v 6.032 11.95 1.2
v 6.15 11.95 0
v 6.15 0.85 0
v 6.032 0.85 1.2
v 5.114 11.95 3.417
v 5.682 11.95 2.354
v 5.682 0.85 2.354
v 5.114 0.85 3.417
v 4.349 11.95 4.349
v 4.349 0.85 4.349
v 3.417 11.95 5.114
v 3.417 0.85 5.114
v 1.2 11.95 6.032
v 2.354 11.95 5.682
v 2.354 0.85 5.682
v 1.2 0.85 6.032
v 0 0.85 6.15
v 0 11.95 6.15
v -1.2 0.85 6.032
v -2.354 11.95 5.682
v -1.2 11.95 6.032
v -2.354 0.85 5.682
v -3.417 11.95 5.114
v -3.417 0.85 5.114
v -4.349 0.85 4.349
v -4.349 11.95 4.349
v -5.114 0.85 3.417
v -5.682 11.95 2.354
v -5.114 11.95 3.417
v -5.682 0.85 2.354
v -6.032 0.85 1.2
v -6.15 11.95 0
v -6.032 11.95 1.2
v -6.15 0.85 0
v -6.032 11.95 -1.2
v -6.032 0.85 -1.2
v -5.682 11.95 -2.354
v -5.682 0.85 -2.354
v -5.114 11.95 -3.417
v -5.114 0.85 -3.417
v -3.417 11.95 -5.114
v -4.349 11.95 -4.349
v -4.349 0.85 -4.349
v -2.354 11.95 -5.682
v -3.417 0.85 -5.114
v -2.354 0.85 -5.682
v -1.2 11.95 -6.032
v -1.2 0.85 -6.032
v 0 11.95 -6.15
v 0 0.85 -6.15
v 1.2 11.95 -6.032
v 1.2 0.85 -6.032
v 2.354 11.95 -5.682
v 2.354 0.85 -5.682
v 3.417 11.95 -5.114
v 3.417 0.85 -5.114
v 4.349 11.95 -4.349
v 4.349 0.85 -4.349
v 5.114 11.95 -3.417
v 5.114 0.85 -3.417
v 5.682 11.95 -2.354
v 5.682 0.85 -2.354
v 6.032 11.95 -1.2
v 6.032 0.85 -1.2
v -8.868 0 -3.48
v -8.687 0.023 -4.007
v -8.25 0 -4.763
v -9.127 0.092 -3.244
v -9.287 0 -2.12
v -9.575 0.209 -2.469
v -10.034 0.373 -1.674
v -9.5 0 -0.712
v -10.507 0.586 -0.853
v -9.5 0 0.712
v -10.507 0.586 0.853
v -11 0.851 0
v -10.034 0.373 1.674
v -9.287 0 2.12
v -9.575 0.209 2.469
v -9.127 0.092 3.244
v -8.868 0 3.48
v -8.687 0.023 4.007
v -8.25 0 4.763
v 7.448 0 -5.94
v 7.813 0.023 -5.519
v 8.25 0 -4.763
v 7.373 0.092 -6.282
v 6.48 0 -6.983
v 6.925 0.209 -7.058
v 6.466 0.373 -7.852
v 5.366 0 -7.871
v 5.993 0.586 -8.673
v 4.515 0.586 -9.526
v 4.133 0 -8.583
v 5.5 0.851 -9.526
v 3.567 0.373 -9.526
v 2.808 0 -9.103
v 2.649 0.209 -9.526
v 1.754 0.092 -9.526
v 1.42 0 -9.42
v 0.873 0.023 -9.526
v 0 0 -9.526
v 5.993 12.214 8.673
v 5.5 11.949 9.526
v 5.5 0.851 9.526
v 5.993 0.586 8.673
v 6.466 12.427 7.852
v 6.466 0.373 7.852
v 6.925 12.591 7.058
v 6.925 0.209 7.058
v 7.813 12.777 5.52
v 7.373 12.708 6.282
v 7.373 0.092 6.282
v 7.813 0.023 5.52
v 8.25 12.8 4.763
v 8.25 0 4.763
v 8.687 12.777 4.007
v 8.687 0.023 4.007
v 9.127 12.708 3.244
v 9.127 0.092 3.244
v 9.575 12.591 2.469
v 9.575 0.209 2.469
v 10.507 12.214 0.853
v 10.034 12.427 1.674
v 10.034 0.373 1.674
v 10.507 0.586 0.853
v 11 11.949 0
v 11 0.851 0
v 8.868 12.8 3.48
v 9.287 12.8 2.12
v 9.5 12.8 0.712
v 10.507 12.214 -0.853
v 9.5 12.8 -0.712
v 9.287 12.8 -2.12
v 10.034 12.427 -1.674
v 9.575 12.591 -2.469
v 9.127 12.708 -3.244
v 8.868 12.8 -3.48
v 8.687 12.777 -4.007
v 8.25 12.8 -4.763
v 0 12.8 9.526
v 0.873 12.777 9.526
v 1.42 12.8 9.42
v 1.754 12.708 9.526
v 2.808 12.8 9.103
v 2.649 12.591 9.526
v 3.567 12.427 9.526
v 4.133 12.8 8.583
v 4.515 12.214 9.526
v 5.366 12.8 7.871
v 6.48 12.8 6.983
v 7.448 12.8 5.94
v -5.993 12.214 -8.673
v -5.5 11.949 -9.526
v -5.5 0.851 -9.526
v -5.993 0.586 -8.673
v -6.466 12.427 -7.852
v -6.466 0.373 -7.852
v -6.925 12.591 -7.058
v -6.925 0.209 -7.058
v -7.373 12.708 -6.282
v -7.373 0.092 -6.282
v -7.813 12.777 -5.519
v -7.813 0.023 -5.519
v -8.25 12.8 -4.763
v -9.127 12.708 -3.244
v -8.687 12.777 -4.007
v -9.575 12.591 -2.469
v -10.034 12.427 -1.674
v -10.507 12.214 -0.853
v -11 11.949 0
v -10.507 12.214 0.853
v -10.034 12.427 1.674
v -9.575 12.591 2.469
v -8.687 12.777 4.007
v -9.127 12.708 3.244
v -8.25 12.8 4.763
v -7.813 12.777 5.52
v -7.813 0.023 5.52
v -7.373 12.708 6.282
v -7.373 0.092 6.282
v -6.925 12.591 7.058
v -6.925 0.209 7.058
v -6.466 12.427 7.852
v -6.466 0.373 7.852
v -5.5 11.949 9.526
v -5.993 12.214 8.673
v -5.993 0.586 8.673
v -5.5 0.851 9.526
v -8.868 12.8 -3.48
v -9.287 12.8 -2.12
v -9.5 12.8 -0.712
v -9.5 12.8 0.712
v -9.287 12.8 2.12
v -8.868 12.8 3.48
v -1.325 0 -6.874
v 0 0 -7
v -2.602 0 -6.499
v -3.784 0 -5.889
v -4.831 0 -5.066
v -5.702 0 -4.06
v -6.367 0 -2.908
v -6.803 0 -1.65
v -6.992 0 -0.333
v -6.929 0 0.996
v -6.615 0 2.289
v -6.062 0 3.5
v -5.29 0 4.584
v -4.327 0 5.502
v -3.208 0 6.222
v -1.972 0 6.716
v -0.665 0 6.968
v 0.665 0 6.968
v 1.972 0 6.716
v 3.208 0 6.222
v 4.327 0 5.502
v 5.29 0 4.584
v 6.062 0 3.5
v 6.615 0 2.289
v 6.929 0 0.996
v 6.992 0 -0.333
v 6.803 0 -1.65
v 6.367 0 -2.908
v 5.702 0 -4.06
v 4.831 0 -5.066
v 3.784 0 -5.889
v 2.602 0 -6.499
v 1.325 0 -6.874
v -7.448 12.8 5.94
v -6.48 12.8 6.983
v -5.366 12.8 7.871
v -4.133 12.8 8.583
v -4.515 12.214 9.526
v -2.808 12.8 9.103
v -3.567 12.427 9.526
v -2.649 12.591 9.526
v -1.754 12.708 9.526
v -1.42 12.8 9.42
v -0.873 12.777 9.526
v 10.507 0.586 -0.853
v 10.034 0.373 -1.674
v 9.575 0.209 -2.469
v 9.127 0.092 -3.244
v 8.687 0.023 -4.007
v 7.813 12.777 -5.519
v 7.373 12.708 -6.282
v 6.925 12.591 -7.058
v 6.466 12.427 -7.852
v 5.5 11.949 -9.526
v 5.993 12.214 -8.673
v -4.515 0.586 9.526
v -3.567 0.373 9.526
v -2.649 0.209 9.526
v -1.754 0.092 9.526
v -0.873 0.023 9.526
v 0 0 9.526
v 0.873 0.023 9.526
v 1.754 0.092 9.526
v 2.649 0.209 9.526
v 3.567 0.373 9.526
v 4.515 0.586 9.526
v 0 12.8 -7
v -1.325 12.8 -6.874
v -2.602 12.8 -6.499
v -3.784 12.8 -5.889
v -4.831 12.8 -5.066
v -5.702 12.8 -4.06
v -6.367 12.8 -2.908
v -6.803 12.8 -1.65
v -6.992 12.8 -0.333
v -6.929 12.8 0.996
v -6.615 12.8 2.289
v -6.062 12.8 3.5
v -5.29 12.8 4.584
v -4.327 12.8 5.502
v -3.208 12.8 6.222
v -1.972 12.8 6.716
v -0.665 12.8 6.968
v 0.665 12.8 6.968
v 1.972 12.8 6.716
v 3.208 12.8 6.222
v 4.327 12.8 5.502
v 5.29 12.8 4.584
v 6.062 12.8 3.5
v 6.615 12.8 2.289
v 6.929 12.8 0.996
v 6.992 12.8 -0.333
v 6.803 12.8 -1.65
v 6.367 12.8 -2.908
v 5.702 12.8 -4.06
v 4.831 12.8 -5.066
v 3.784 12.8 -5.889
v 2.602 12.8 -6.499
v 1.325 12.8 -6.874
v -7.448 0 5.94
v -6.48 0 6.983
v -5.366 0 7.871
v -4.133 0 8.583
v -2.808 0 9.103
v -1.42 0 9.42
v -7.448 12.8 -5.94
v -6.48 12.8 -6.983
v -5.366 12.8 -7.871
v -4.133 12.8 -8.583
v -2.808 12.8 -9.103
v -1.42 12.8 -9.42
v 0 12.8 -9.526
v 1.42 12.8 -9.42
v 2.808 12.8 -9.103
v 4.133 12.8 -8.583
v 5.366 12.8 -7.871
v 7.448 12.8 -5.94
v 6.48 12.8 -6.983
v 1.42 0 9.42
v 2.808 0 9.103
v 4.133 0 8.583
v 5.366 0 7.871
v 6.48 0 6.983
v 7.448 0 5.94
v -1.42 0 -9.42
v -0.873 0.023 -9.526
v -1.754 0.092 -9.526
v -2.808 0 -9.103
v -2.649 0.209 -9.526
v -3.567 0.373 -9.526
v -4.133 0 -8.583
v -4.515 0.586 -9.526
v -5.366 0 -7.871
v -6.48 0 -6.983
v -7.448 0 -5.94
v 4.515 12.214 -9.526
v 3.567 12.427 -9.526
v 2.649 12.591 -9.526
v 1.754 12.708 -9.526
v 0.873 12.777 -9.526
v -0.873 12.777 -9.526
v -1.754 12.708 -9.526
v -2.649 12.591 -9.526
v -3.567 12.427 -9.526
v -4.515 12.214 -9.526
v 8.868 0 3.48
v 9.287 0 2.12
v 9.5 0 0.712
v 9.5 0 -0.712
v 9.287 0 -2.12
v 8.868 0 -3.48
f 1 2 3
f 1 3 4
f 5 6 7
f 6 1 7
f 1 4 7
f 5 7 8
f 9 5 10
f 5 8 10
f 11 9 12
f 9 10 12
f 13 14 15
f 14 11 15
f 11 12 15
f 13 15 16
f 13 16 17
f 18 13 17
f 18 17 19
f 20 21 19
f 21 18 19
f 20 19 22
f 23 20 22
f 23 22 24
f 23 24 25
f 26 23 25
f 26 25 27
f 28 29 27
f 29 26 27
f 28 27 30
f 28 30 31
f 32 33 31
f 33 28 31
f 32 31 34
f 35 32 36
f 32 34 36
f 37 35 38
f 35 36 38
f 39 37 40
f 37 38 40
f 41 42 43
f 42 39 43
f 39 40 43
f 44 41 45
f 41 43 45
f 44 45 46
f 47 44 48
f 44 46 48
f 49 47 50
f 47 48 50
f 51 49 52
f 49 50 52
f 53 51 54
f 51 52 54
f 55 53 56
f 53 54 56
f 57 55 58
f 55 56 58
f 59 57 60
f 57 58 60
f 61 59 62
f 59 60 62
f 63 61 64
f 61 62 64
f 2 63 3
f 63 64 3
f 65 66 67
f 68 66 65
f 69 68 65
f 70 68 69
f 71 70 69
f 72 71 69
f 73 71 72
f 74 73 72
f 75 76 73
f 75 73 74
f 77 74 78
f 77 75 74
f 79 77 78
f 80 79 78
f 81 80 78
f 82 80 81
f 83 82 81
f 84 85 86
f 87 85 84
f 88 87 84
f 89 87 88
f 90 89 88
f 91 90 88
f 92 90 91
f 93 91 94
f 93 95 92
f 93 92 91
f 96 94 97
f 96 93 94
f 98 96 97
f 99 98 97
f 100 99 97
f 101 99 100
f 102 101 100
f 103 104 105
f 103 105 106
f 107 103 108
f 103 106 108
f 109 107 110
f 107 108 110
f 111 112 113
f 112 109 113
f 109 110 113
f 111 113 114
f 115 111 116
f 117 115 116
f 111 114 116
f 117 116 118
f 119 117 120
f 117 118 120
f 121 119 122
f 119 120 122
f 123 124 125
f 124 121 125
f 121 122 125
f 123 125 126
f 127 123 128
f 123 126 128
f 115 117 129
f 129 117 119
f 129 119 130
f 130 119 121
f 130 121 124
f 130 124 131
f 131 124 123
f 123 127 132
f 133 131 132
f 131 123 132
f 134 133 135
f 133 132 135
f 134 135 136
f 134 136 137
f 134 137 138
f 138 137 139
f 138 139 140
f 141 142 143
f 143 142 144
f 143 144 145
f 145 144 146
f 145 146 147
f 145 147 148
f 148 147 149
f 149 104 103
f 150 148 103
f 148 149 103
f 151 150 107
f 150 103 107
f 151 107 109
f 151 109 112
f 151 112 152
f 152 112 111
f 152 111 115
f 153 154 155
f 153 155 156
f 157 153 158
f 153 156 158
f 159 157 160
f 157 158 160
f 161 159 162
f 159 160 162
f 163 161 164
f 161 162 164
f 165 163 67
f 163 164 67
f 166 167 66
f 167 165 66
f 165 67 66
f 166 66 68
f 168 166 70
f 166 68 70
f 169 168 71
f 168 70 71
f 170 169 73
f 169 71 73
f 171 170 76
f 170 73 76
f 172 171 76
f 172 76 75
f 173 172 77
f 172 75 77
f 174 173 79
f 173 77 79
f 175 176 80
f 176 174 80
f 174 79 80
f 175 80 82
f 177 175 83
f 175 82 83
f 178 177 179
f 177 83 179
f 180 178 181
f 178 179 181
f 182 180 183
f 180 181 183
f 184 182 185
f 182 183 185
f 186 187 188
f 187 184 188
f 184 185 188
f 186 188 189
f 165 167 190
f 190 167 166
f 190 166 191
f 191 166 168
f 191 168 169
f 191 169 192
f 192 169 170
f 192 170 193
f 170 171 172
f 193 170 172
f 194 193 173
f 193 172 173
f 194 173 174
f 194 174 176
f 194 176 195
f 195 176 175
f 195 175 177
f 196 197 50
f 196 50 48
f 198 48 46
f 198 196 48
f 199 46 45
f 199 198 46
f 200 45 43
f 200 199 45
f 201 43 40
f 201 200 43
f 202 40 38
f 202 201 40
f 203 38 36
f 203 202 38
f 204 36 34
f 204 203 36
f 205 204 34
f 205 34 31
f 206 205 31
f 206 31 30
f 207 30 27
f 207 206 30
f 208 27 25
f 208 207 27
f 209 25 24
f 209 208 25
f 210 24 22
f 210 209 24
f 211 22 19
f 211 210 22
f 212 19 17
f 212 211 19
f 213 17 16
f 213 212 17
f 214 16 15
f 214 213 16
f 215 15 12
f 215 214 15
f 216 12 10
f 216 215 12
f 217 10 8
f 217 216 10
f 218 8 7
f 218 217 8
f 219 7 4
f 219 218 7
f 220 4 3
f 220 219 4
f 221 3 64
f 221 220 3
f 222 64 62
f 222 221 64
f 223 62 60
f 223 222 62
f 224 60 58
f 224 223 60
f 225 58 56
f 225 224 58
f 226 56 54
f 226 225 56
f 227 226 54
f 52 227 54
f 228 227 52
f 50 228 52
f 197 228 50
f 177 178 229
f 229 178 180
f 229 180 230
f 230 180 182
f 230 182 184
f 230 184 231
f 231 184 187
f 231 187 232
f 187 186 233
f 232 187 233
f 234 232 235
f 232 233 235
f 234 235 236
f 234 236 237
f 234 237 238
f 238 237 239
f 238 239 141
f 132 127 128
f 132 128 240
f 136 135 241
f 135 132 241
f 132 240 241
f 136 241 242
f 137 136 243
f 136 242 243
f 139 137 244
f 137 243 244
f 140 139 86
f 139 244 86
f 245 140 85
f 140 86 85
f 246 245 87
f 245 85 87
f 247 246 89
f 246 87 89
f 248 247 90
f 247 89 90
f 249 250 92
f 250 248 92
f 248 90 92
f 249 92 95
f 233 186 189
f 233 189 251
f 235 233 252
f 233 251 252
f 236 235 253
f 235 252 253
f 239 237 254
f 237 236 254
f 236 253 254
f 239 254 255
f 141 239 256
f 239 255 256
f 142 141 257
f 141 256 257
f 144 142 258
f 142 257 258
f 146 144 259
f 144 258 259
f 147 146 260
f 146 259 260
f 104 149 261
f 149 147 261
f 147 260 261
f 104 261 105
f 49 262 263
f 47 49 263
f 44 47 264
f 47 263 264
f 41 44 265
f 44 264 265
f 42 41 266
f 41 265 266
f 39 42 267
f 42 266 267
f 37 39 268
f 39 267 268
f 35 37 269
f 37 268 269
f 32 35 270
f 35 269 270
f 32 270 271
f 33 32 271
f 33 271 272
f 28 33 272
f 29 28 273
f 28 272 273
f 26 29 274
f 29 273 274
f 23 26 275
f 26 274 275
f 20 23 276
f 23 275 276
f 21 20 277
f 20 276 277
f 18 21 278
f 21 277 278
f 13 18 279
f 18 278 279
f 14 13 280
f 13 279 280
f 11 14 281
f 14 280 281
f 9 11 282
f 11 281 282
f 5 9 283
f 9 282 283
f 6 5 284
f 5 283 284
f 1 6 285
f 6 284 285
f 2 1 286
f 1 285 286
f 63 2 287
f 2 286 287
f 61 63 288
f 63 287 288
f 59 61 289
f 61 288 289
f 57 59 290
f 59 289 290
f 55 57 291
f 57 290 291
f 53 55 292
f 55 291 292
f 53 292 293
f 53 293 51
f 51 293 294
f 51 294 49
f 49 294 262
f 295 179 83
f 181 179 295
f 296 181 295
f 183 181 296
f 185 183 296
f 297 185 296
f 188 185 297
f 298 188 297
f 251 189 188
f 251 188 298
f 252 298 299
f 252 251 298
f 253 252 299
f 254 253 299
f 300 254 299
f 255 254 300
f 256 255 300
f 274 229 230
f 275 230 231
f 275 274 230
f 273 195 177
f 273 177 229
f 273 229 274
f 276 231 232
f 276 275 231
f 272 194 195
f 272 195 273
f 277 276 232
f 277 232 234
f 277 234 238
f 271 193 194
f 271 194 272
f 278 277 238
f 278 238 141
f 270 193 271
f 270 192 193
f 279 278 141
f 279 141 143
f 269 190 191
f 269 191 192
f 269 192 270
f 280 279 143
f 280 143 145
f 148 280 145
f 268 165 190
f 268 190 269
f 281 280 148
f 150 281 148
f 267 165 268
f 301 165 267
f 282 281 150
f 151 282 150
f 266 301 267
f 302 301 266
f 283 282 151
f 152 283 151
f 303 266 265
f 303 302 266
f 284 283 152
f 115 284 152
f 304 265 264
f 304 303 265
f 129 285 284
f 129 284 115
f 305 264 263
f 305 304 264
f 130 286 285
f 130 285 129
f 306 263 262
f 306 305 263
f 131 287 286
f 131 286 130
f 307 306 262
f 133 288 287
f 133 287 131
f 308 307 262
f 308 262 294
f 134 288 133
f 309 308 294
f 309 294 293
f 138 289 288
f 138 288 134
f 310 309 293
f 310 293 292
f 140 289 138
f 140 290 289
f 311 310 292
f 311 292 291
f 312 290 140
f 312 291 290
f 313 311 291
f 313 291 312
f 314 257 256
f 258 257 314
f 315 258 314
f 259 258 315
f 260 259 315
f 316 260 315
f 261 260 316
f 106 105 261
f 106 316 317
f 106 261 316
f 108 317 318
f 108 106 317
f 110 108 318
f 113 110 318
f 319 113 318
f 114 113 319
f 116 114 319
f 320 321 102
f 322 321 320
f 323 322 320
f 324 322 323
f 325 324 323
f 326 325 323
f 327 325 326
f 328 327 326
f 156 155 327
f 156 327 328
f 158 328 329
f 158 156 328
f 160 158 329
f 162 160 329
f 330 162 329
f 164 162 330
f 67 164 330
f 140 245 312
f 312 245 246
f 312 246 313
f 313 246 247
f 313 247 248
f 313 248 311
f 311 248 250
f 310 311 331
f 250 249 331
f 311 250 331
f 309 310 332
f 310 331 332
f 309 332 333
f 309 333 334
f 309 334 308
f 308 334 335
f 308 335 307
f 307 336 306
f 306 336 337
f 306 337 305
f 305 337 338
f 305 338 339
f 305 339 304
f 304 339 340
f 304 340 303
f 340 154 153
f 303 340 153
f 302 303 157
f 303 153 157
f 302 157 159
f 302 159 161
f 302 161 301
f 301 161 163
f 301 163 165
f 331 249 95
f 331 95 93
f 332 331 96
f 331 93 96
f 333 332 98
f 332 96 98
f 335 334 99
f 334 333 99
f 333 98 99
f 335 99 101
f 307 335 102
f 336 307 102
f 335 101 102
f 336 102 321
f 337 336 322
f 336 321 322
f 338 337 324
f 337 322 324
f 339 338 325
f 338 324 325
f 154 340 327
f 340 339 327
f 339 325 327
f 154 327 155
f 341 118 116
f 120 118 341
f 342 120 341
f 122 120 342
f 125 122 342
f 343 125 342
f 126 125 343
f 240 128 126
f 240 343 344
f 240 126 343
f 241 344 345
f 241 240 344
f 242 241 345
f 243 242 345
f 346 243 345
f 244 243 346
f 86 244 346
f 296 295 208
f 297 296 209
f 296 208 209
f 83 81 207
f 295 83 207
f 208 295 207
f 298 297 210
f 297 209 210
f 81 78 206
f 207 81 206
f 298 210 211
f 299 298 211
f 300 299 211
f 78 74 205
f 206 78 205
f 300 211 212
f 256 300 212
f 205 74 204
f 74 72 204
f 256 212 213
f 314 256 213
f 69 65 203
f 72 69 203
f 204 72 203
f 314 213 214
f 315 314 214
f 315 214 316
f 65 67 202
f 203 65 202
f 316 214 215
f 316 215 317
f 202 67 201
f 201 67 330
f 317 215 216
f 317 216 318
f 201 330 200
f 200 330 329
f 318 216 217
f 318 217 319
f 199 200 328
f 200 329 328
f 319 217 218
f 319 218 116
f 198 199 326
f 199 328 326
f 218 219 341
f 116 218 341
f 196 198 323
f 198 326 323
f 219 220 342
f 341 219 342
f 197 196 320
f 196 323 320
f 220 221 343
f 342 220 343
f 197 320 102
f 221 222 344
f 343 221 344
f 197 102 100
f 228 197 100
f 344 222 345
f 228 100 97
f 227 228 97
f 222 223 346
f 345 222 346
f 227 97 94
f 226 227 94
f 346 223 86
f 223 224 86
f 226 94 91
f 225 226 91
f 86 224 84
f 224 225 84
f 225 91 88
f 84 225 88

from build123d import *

# Parameters (mm, degrees)
EXTRUDE1_DEPTH  = 12.8
HOLE_WIZARD_D_D = 12.3


with BuildPart() as part:
    # Sketch1 → Extrude1 (new body)
    with BuildSketch(Plane(origin=(0, 0, 0), x_dir=(1, 0, 0), z_dir=(0, 1, 0))):
        Polygon((5.5, 9.526279442), (-5.5, 9.526279442), (-11, 0), (-5.5, -9.526279442), (5.5, -9.526279442), (11, 0), align=None)
    extrude(amount=EXTRUDE1_DEPTH)

    # d (through all)
    with Locations(Plane(origin=(0, 12.8, 0), x_dir=(-1, 0, 0), z_dir=(0, 1, 0))):
        with Locations((0, 0)):
            Hole(HOLE_WIZARD_D_D / 2)

    # Sketch5 → Cut-Revolve1 (revolve, cut)
    with BuildSketch(Plane(origin=(0, 0, 0), x_dir=(0, 0, -1), z_dir=(1, 0, 0))):
        Polygon((-9.526279442, 12.8), (-11.5, 11.660471904), (-11.5, 12.8), align=None)
        Polygon((-11.5, 0), (-9.526279442, 0), (-11.5, 1.139528096), align=None)
    revolve(axis=Axis((0, 0, 0), (0, 1, 0)), mode=Mode.SUBTRACT)

    # Sketch7 → Cut-Revolve2 (revolve, cut)
    with BuildSketch(Plane(origin=(0, 0, 0), x_dir=(0, 0, -1), z_dir=(1, 0, 0)), mode=Mode.PRIVATE) as cut_revolve2_sk:
        Polygon((-7, 12.8), (-6.15, 12.8), (-6.15, 11.95), align=None)
        Polygon((-6.15, 0.85), (-7, 0), (-6.15, 0), align=None)
    revolve(cut_revolve2_sk.sketch.rotate(Axis((0, 0, 0), (0, 1, 0)), 180), axis=Axis((0, 0, 0), (0, 1, 0)), mode=Mode.SUBTRACT)


solid = part.part
